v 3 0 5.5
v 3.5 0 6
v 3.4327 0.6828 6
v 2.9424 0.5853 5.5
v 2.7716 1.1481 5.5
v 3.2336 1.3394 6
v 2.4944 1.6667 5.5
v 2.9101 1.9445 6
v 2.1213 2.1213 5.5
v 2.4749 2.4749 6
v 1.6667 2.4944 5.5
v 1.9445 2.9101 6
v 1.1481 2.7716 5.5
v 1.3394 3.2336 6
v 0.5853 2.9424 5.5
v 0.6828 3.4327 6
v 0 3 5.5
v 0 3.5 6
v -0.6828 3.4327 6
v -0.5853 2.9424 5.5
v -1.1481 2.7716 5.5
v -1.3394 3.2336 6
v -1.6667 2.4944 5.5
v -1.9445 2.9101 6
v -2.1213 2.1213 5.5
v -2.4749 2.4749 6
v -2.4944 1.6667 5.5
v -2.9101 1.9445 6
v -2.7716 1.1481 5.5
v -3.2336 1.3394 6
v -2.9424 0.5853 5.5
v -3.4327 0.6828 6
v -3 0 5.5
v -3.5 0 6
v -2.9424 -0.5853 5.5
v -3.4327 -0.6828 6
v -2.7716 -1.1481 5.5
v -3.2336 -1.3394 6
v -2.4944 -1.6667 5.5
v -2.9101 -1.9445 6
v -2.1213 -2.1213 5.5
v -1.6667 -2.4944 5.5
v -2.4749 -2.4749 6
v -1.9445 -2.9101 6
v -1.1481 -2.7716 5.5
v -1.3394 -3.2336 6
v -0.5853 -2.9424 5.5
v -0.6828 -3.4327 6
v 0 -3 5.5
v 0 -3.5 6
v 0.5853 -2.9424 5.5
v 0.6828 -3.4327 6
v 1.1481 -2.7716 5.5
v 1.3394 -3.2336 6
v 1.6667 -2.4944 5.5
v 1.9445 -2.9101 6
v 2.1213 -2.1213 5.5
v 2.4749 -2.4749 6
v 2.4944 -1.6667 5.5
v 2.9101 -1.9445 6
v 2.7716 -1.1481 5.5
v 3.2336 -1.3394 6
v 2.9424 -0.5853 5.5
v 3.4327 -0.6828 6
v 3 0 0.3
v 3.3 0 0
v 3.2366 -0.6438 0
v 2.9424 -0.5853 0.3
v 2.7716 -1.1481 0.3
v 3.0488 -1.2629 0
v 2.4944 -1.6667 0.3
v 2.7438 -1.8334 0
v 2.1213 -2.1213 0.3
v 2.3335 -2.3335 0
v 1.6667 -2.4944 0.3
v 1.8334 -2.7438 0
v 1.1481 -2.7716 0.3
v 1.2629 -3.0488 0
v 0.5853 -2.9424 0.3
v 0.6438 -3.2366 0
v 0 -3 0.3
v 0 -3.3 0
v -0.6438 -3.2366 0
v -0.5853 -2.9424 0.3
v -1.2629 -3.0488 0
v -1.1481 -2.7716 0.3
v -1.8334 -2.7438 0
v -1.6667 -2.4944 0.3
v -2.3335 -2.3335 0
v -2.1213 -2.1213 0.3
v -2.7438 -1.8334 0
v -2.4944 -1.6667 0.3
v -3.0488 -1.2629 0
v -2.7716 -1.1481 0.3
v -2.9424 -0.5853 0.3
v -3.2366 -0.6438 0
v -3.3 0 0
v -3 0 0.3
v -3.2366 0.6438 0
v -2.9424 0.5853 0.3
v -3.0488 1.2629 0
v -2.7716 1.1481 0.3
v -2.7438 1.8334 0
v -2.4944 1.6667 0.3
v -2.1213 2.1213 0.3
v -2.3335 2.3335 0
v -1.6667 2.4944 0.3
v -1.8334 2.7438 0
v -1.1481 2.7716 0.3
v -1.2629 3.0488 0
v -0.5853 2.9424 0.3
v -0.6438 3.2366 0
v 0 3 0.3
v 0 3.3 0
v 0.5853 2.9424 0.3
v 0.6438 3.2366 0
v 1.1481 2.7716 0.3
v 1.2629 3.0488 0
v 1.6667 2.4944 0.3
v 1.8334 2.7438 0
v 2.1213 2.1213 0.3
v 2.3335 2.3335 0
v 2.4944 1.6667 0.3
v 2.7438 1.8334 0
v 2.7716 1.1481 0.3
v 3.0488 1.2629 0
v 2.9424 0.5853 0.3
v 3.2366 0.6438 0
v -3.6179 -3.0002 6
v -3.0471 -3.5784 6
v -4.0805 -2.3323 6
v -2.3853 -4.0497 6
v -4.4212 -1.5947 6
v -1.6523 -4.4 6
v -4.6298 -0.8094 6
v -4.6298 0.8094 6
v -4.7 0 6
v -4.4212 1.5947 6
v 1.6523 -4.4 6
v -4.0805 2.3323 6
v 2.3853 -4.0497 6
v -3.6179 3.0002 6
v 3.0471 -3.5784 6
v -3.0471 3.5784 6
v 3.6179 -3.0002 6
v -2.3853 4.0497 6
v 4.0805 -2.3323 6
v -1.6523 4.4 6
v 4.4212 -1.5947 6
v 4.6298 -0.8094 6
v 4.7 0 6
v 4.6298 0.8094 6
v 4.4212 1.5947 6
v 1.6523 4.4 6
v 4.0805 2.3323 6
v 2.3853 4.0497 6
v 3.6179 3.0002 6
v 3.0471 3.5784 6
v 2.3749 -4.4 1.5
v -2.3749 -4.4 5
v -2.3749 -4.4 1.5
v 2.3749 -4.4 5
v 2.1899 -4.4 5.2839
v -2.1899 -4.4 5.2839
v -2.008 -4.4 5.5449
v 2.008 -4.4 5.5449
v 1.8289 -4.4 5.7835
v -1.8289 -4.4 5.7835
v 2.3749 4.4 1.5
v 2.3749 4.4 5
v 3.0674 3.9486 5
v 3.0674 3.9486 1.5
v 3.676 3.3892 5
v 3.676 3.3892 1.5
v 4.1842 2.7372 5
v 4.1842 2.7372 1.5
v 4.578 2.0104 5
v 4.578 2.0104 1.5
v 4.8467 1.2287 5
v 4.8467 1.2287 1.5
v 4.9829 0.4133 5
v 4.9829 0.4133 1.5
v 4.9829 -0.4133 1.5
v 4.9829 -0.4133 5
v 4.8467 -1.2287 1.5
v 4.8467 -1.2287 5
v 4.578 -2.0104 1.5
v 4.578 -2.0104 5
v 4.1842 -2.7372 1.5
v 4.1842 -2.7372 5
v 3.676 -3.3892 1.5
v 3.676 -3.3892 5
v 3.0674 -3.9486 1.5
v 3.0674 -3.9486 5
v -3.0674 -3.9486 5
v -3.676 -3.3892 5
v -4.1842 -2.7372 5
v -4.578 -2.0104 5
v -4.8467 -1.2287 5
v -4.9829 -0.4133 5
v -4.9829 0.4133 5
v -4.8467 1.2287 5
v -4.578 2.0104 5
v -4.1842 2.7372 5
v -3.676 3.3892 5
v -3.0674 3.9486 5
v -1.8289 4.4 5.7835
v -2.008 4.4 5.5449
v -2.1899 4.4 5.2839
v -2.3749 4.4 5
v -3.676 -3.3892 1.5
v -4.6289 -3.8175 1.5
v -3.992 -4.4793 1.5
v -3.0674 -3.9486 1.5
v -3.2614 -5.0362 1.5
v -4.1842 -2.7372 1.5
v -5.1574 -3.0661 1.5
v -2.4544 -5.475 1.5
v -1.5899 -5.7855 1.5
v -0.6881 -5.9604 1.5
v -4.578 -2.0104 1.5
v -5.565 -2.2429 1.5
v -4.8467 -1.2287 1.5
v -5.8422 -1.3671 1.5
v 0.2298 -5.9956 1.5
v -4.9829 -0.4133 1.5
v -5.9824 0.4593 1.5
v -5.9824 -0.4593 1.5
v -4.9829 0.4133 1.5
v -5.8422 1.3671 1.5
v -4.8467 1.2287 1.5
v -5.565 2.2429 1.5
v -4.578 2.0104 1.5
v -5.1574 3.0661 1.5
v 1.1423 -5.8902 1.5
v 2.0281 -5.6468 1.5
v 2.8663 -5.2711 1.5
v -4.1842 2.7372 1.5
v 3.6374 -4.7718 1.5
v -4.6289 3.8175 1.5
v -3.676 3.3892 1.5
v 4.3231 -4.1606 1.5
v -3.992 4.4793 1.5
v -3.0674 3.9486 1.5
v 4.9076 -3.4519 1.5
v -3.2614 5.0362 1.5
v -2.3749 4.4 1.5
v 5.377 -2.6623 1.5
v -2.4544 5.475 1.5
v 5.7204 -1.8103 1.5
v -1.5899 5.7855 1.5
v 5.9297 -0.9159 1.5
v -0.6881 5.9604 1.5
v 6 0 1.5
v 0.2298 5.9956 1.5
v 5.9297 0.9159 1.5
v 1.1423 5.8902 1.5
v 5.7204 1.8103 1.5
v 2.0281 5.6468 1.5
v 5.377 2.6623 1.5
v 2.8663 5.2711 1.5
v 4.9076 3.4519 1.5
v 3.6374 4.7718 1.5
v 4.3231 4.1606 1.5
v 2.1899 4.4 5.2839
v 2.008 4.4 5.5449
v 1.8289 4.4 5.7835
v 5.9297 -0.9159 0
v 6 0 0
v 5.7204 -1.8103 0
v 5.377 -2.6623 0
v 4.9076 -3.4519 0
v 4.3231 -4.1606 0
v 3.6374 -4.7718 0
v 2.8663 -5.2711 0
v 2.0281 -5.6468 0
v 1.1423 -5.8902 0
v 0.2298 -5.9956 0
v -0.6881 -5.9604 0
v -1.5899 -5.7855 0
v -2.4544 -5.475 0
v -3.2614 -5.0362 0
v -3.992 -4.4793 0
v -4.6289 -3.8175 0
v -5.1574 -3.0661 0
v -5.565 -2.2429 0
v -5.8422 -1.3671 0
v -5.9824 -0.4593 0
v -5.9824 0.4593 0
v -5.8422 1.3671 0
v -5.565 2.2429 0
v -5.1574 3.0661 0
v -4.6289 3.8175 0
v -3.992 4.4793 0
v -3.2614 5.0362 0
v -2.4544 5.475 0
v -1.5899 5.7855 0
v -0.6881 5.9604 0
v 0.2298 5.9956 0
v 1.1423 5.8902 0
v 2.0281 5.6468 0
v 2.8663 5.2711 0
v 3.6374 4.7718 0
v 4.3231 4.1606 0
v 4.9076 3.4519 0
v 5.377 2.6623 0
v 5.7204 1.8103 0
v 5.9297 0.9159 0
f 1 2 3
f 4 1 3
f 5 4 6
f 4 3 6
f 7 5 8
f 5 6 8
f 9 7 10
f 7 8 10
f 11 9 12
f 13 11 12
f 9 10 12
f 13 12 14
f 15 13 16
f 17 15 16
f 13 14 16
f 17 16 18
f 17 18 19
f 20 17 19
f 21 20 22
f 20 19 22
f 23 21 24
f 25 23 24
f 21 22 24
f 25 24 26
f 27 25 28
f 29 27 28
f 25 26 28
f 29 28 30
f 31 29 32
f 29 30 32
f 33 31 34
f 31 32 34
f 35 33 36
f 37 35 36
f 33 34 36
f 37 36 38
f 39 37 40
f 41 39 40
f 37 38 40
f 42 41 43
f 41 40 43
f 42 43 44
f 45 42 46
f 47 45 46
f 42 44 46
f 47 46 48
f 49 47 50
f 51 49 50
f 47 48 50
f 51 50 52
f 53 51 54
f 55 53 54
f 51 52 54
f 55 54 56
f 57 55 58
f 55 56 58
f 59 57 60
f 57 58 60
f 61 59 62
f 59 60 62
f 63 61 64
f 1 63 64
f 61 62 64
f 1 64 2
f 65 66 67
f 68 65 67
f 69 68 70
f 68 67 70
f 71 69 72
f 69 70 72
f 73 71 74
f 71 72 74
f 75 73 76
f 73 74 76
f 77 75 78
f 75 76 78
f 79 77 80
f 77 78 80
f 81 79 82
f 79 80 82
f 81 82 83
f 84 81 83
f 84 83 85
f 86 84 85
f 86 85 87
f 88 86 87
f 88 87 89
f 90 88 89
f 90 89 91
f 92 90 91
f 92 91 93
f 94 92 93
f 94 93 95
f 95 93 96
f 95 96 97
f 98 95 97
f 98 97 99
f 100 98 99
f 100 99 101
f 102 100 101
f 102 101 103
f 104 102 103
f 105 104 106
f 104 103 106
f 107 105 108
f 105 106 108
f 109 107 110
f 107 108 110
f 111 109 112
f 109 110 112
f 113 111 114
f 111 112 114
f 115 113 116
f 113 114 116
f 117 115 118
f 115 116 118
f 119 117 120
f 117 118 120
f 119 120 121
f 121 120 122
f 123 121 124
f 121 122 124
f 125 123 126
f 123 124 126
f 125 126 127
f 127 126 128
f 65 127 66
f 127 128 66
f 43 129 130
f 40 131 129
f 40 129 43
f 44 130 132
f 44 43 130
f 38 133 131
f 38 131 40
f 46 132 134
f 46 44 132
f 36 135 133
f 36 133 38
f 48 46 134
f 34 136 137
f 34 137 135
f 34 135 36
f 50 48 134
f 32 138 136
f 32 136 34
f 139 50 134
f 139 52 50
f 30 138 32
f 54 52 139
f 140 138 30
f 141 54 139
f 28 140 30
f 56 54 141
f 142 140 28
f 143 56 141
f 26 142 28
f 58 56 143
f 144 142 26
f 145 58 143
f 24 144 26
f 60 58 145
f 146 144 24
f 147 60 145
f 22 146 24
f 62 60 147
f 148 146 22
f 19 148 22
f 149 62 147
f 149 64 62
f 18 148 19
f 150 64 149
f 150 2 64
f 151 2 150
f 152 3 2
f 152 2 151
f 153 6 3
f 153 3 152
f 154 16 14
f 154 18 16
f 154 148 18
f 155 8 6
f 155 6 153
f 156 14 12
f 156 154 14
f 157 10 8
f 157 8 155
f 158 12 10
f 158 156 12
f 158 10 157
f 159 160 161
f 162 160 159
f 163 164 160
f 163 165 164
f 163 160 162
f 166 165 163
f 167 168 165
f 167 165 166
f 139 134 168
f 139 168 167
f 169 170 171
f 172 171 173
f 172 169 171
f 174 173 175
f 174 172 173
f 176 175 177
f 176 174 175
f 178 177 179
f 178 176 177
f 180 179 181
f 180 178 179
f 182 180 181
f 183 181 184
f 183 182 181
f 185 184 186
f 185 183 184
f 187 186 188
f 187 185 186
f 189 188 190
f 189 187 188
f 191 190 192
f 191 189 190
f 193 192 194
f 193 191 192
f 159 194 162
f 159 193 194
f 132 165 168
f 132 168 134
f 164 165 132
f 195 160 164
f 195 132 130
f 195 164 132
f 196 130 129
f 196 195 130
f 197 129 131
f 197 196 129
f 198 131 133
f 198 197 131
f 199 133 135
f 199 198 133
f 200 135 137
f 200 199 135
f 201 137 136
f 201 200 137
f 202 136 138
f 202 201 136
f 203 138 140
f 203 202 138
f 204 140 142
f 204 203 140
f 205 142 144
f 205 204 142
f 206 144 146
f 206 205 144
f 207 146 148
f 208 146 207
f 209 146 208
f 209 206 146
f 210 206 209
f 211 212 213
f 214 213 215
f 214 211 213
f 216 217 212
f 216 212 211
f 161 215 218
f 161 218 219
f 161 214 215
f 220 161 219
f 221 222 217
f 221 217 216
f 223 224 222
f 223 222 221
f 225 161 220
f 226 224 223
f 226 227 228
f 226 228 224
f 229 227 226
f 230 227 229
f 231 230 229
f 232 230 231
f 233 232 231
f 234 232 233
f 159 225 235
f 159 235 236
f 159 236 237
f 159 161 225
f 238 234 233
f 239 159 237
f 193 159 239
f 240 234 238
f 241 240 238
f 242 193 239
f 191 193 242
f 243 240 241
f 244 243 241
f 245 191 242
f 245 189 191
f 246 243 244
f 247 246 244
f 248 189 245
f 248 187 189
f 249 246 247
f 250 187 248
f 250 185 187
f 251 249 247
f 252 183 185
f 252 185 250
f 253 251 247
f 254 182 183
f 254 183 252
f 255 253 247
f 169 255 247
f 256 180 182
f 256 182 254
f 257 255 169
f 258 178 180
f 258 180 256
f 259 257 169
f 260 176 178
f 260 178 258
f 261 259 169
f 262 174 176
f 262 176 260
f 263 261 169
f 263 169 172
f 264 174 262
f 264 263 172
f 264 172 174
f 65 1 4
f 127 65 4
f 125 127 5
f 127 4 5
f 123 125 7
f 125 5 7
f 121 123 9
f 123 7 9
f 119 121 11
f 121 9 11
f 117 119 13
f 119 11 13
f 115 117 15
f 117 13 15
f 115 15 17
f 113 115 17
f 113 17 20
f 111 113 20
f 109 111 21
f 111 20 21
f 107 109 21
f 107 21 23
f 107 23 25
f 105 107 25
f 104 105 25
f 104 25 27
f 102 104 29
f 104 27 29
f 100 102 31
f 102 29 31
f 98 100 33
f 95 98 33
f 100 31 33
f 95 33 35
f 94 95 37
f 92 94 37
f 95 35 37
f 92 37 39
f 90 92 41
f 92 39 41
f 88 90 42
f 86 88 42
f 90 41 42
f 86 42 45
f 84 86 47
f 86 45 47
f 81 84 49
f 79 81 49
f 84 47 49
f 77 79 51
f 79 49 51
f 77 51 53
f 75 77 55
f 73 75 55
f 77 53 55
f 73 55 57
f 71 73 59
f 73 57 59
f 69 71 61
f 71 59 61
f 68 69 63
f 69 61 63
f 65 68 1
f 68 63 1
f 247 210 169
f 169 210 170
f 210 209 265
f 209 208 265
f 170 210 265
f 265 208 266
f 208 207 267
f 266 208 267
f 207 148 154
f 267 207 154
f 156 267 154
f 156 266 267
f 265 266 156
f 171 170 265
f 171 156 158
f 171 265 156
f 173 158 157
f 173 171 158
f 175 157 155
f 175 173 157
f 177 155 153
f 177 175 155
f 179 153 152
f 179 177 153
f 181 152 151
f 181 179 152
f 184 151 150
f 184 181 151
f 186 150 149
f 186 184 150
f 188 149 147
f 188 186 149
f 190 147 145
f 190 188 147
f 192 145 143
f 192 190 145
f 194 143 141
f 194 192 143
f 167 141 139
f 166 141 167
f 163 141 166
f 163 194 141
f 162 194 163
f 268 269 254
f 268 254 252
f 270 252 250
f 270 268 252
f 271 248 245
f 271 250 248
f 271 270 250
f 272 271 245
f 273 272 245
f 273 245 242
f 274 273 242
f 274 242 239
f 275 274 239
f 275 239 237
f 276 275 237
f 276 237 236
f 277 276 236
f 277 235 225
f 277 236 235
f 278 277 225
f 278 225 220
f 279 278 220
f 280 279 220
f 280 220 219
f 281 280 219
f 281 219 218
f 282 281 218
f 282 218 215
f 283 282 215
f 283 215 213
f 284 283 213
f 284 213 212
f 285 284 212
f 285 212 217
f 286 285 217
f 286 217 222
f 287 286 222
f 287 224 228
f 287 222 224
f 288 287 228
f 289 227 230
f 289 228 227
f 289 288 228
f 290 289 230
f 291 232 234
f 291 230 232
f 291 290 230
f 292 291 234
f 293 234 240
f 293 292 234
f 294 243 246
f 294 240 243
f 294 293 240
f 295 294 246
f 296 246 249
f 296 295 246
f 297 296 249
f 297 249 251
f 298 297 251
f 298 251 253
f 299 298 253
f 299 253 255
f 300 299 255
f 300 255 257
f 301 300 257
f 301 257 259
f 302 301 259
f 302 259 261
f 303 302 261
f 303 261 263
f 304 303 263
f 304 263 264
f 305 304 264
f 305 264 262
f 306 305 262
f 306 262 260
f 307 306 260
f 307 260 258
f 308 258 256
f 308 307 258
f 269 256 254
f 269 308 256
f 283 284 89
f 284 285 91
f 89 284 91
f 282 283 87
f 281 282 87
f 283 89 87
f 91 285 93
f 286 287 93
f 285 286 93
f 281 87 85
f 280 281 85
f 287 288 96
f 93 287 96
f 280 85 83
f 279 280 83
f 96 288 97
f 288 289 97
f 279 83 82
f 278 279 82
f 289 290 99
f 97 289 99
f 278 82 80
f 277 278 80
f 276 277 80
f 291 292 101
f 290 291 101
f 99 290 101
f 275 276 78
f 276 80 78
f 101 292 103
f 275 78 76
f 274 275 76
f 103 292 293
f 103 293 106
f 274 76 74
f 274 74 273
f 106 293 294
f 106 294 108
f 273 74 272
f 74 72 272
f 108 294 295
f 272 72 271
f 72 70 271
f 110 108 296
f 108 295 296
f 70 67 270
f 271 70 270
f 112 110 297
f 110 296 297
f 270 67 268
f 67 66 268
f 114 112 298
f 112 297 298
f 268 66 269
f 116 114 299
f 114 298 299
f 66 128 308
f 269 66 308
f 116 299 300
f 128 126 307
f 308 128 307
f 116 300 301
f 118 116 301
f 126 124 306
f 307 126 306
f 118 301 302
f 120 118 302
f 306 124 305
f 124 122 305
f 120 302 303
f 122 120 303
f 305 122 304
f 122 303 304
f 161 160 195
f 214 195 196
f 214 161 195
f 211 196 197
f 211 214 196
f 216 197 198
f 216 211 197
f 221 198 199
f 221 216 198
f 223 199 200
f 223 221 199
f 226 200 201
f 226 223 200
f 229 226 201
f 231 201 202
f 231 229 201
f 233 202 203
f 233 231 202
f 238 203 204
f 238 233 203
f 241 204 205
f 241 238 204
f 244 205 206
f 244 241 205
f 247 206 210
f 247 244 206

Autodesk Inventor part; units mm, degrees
ref_plane "YZ Plane" through (0, 0, 0) normal (1, 0, 0) x (0, 1, 0)
ref_plane "XZ Plane" through (0, 0, 0) normal (0, 1, 0) x (-1, 0, 0)
ref_plane "XY Plane" through (0, 0, 0) normal (0, 0, 1) x (1, 0, 0)
sketch "Sketch1" plane through (0, 0, 0) normal (0, 1, 0) x (-1, 0, 0)
  line L0 (0, 0) -> (0, 6)
  line L1 (-3, 0) -> (-3, 6)
  line L2 (-3, 6) -> (-5, 6)
  line L3 (-5, 6) -> (-5, 1.5)
  line L4 (-5, 1.5) -> (-6, 1.5)
  line L5 (-6, 1.5) -> (-6, 0)
  line L6 (-6, 0) -> (-3, 0)
  dimension "InsideDiameter" = 6
  dimension "OuterDiameter" = 10
  dimension "FlangeDiameter" = 12
  dimension "FlangeThickness" = 1.5
  dimension "Length" = 6
revolve "Revolution1" add sketch "Sketch1" angle 360 about axis through (0, 0, 0) along (0, 0, 1)
chamfer "Chamfer1" distance 0.3 angle 45 1 edges at (-3, 0, 0)
chamfer "Chamfer2" distance 0.5 angle 45 1 edges at (-3, 0, 6)
chamfer "Chamfer3" distance 0.3 distance2 1 1 edges at (-5, 0, 6) measured on face at (4.4516, -0.3989, 6)
sketch "Sketch2" plane through (0, 0, 6) normal (0, 0, 1) x (1, 0, 0)
  circle A0 centre (0, 0) radius 5 projected
  line L0 (-2.3749, -4.4) -> (2.3749, -4.4)
  line L1 (-5, 0) -> (5, 0) construction
  line L2 (-2.3749, 4.4) -> (2.3749, 4.4)
  dimension "Width" = 8.8
extrude "Extrusion1" cut sketch "Sketch2" against normal up to surface (4.5 mm away) contours L2 A0 | A0 L0
properties part number "LED-0606" material "Acetal Resin, Black"
